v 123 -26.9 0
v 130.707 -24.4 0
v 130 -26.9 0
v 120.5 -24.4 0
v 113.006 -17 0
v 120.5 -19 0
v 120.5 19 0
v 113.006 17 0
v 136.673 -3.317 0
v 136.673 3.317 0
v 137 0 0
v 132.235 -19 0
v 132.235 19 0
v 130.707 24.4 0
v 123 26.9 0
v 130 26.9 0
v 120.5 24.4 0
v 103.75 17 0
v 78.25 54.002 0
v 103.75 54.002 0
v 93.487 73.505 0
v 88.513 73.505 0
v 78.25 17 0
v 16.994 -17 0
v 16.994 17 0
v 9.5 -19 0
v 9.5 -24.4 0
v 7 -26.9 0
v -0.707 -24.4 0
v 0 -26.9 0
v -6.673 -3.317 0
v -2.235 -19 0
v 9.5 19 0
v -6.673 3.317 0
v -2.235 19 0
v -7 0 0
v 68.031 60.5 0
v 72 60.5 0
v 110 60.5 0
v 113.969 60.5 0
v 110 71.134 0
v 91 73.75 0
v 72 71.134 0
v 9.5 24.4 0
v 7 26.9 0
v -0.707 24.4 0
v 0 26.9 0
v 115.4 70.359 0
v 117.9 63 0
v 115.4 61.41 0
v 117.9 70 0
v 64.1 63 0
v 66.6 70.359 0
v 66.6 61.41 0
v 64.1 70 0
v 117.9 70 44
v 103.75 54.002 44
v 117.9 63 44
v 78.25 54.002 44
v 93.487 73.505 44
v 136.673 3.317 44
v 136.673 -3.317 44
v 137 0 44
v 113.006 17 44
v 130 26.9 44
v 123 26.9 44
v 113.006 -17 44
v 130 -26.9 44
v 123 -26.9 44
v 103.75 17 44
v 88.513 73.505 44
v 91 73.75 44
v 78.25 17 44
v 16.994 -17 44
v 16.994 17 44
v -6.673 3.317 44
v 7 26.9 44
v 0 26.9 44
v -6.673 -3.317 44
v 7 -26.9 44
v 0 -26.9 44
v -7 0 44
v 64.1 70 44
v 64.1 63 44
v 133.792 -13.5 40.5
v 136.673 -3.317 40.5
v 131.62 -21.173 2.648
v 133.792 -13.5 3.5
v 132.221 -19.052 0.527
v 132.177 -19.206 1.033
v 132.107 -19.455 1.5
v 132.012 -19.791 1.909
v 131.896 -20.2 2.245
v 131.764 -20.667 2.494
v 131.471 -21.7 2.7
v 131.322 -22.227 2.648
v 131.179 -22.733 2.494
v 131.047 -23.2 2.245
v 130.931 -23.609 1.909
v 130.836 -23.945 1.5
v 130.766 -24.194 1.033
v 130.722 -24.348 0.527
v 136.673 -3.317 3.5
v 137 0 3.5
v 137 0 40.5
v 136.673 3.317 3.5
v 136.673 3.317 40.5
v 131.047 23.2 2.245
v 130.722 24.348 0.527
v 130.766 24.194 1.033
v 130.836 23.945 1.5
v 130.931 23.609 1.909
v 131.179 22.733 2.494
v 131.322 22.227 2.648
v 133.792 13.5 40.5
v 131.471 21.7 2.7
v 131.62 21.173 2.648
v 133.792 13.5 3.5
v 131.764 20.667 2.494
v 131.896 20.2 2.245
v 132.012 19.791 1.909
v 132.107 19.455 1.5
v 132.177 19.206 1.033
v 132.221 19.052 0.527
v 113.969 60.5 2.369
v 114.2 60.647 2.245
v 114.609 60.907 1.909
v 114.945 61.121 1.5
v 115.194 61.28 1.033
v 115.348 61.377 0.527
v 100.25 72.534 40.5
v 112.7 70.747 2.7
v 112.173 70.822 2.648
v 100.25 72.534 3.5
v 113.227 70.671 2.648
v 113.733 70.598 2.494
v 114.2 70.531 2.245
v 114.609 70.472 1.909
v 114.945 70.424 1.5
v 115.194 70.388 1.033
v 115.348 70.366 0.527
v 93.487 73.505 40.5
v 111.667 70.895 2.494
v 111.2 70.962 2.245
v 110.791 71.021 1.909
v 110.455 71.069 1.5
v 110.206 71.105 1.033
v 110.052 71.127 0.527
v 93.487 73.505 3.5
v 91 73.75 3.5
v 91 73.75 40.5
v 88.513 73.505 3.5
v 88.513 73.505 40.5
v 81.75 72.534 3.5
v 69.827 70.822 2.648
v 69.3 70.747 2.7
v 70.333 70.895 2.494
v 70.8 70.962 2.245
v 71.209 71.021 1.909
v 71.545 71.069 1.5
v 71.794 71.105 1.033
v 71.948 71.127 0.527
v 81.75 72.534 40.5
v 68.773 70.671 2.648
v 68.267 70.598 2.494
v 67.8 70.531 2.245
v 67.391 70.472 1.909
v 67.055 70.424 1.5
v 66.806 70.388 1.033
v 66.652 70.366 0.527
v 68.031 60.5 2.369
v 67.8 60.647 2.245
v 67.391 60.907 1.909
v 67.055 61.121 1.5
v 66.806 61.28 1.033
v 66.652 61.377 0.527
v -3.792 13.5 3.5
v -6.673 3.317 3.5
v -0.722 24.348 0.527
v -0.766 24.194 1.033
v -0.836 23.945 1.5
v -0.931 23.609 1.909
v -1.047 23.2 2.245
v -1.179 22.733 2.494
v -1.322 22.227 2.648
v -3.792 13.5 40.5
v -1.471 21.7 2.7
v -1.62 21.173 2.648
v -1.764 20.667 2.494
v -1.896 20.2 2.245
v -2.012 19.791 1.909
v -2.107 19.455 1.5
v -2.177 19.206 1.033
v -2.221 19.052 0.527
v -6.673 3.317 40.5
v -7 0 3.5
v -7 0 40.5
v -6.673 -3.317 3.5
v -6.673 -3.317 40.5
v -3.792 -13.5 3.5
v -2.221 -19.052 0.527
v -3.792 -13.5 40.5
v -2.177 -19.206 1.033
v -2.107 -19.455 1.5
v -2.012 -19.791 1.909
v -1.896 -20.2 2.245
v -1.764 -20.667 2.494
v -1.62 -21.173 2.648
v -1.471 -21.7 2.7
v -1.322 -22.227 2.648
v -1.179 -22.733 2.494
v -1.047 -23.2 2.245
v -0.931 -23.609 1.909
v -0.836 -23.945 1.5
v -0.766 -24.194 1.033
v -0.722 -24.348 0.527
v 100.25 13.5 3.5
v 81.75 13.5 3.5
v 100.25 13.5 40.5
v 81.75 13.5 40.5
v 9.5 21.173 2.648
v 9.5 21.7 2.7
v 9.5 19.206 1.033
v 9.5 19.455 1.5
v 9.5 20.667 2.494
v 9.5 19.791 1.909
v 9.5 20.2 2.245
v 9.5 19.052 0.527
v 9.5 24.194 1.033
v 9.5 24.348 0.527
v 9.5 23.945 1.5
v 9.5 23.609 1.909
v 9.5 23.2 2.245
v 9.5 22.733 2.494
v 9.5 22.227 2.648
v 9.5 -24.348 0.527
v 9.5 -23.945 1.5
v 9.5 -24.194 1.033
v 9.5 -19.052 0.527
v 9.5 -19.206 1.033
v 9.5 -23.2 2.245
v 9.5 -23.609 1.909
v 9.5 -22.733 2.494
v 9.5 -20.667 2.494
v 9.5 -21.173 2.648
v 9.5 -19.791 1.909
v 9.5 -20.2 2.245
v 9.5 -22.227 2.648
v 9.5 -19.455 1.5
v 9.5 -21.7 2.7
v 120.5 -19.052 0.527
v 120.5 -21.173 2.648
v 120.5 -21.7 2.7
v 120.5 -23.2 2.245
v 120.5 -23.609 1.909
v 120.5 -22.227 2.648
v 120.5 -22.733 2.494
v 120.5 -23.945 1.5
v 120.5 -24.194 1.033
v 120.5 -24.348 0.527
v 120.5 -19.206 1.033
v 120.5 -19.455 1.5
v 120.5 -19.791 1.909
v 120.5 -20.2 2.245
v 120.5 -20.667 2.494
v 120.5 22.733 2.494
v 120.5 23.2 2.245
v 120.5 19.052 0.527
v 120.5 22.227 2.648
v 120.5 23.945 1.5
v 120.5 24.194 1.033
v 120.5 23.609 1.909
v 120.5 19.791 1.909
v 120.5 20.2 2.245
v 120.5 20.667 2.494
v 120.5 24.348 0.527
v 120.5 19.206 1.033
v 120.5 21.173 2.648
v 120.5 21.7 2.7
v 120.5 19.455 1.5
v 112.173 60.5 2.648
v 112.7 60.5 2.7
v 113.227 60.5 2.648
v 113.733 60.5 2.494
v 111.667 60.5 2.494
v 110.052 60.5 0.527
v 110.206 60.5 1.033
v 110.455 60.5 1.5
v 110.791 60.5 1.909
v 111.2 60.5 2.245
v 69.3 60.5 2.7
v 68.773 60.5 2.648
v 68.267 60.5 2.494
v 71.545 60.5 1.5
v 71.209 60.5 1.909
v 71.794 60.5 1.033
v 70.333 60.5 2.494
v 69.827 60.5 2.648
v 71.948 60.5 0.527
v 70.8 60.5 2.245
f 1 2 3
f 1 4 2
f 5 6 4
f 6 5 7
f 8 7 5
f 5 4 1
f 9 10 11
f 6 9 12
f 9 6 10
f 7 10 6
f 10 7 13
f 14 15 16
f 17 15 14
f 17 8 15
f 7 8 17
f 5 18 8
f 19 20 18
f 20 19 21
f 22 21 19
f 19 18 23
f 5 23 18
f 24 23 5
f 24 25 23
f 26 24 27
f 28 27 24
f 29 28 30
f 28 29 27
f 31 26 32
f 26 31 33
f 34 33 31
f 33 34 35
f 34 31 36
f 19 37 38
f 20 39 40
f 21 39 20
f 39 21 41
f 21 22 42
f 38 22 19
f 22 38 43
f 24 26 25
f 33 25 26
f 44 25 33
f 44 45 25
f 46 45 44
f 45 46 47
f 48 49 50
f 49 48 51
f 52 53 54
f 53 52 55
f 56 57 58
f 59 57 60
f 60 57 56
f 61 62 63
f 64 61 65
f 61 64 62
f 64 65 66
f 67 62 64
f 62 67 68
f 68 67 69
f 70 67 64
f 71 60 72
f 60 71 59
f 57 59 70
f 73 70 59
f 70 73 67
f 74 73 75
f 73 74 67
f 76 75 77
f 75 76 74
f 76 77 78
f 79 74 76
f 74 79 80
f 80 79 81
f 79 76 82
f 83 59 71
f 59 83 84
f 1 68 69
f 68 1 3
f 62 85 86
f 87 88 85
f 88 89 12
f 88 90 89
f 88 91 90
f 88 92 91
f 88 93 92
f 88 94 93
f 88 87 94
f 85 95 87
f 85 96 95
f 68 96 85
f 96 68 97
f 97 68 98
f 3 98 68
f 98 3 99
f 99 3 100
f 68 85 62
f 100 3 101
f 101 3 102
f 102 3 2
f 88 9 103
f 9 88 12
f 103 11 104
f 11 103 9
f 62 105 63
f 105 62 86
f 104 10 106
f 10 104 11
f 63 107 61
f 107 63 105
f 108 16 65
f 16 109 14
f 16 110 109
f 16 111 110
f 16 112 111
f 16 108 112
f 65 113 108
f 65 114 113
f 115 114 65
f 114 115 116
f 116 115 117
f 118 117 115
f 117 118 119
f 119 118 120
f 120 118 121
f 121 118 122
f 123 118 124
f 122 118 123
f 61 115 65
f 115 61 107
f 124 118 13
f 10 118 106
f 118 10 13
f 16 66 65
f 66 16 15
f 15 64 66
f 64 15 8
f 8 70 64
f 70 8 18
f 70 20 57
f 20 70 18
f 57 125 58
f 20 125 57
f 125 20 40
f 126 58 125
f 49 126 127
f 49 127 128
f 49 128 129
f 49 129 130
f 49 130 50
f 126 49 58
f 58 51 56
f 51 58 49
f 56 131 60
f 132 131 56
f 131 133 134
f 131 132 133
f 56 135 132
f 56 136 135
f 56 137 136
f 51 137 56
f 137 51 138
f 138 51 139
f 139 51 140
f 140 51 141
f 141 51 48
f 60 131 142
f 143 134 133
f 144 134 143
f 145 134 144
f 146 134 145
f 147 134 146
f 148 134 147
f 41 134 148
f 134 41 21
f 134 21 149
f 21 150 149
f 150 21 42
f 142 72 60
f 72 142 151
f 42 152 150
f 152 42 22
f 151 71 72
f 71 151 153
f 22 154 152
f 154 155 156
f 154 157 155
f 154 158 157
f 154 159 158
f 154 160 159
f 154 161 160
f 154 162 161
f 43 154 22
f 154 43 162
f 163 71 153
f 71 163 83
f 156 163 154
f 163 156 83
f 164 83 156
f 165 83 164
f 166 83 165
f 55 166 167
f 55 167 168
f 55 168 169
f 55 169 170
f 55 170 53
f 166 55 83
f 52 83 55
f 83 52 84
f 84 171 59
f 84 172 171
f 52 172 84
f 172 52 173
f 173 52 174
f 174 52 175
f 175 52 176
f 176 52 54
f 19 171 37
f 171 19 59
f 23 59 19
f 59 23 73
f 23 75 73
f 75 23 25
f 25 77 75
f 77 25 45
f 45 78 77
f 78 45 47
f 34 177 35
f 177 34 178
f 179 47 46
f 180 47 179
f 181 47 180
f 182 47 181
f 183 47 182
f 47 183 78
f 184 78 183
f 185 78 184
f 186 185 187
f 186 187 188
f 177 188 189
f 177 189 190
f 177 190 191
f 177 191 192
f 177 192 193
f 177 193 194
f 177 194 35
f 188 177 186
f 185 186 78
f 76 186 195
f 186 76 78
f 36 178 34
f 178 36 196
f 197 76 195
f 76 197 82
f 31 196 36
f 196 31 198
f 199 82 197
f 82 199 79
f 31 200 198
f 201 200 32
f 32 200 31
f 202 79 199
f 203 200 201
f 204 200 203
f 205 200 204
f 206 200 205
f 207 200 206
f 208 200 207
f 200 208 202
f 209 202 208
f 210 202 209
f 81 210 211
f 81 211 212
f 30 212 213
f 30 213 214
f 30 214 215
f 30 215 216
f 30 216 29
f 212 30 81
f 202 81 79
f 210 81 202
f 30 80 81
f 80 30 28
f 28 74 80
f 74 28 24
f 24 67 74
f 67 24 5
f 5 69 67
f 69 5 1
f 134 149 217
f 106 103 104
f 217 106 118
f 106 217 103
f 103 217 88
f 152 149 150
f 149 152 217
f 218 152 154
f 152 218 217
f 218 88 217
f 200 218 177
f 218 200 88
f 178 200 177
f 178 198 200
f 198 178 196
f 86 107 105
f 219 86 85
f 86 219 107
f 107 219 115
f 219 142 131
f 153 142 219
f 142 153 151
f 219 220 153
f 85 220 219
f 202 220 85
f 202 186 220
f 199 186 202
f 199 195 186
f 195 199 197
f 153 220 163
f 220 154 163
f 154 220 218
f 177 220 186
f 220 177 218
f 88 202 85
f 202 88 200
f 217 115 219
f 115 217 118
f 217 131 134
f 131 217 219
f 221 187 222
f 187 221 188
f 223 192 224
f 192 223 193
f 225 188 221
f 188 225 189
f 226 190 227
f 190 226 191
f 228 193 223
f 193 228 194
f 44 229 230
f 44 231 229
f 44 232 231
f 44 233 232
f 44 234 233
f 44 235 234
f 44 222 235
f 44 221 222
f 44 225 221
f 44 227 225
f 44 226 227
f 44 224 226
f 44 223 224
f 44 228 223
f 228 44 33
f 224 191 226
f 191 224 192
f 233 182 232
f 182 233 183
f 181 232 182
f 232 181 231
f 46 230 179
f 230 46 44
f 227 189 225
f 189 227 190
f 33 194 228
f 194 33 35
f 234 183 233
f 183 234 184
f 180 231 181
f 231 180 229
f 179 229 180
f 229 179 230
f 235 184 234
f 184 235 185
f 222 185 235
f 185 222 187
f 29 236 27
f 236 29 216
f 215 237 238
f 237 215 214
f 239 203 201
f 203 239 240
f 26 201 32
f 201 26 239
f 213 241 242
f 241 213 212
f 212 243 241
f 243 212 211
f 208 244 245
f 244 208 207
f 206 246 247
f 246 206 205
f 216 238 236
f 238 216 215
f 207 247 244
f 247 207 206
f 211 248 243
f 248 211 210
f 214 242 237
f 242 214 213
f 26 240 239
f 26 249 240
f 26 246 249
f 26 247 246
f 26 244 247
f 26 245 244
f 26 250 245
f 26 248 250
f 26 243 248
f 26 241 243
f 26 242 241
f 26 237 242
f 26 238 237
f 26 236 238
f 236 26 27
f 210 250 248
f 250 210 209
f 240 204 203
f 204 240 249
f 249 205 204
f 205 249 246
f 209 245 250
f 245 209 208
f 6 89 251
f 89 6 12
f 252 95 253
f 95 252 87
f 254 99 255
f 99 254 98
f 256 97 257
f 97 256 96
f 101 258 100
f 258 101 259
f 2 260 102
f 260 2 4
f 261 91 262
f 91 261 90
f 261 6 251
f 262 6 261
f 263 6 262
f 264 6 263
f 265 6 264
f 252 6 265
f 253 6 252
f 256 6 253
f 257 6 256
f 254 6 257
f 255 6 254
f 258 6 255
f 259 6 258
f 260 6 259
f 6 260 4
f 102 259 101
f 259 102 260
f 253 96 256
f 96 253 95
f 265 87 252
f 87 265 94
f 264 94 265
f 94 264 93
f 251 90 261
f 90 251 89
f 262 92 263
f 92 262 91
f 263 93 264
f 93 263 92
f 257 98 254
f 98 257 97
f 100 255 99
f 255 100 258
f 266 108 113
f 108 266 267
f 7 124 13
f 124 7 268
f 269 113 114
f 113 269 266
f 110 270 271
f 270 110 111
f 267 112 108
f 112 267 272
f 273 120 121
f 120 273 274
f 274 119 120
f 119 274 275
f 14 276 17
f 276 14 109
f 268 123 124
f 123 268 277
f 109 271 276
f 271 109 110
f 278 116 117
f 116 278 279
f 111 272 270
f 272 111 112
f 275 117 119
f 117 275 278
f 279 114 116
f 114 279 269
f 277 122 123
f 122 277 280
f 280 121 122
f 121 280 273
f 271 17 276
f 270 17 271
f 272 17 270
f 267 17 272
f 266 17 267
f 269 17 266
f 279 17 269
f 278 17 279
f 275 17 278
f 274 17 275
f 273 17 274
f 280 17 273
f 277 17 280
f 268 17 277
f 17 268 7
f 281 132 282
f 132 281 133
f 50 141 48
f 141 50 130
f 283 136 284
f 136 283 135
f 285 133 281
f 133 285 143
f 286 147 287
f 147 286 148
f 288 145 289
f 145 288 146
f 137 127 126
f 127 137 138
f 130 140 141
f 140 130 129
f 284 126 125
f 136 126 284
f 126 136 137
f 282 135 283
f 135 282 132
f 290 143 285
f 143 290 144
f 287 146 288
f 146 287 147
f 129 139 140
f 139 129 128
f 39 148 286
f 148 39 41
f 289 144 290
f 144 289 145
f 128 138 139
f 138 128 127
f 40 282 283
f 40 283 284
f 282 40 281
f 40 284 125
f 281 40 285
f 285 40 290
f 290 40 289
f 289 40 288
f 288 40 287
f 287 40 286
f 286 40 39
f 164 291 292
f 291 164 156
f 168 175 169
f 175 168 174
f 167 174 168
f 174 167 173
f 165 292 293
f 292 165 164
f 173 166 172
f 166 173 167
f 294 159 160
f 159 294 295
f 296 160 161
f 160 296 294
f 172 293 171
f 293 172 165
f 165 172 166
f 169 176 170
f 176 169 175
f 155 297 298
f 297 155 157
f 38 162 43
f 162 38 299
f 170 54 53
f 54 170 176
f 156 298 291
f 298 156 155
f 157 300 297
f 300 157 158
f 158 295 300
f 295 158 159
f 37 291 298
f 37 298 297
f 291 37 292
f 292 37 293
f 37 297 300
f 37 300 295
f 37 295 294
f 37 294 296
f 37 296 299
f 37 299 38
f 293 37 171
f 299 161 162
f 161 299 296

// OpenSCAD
$fn = 32;

// ----------------------------------------------------------------------
// Air duct: 34 mm duct, 3.5 mm wall, 44 mm across
// ----------------------------------------------------------------------

// --- parameters (mm) ---
duct_r = 17;              // duct core radius
duct_d = 34;              // duct core diameter
wall = 3.5;               // duct wall thickness
height = 44;              // duct width (extrusion height)
port_r = 26.9;            // port flange half width
port_d = 53.8;            // port flange width
port_t = 7;               // port flange thickness
bolt_d = 5.4;             // port bolt holes
bolt_offset = 21.7;       // bolt hole offset from the port axis
branch_r = 12.75;         // branch core radius
branch_d = 25.5;          // branch core diameter
branch_len = 70;          // branch length from the run axis

difference() {
  /* outer hull chain: tube with a flat flange plate at every port */
  linear_extrude(height = 44) {
    hull() {
      polygon([[0, -26.9], [0, 26.9], [7, 26.9], [7, -26.9]]);
      translate([10, 0]) circle(r = 17);
    }
    hull() {
      translate([10, 0]) circle(r = 17);
      translate([39, 0]) circle(r = 17);
    }
    hull() {
      translate([39, 0]) circle(r = 17);
      translate([91, 0]) circle(r = 17);
    }
    hull() {
      translate([91, 0]) circle(r = 17);
      translate([120, 0]) circle(r = 17);
    }
    hull() {
      translate([120, 0]) circle(r = 17);
      polygon([[130, 26.9], [130, -26.9], [123, -26.9], [123, 26.9]]);
    }
    hull() {
      translate([91, 0]) circle(r = 12.75);
      translate([91, 38.5]) circle(r = 12.75);
    }
    hull() {
      translate([91, 38.5]) circle(r = 12.75);
      translate([91, 61]) circle(r = 12.75);
    }
    hull() {
      translate([91, 61]) circle(r = 12.75);
      polygon([[64.1, 70], [117.9, 70], [117.9, 63], [64.1, 63]]);
    }
  }
  /* air passage: the same chain inset by the wall, 5 mm proud of the ports */
  translate([0, 0, 3.5]) linear_extrude(height = 37) {
    hull() {
      translate([-5, 0]) circle(r = 13.5);
      translate([39, 0]) circle(r = 13.5);
    }
    hull() {
      translate([39, 0]) circle(r = 13.5);
      translate([91, 0]) circle(r = 13.5);
    }
    hull() {
      translate([91, 0]) circle(r = 13.5);
      translate([135, 0]) circle(r = 13.5);
    }
    hull() {
      translate([91, 0]) circle(r = 9.25);
      translate([91, 38.5]) circle(r = 9.25);
    }
    hull() {
      translate([91, 38.5]) circle(r = 9.25);
      translate([91, 75]) circle(r = 9.25);
    }
  }
  translate([0, 0]) rotate([0, 0, -90]) translate([-21.7, -2.5]) rotate([-90, 0, 0]) cylinder(h = 12, d = 5.4);
  translate([0, 0]) rotate([0, 0, -90]) translate([21.7, -2.5]) rotate([-90, 0, 0]) cylinder(h = 12, d = 5.4);
  translate([130, 0]) rotate([0, 0, 90]) translate([-21.7, -2.5]) rotate([-90, 0, 0]) cylinder(h = 12, d = 5.4);
  translate([130, 0]) rotate([0, 0, 90]) translate([21.7, -2.5]) rotate([-90, 0, 0]) cylinder(h = 12, d = 5.4);
  translate([91, 70]) rotate([0, 0, 180]) translate([-21.7, -2.5]) rotate([-90, 0, 0]) cylinder(h = 12, d = 5.4);
  translate([91, 70]) rotate([0, 0, 180]) translate([21.7, -2.5]) rotate([-90, 0, 0]) cylinder(h = 12, d = 5.4);
}
